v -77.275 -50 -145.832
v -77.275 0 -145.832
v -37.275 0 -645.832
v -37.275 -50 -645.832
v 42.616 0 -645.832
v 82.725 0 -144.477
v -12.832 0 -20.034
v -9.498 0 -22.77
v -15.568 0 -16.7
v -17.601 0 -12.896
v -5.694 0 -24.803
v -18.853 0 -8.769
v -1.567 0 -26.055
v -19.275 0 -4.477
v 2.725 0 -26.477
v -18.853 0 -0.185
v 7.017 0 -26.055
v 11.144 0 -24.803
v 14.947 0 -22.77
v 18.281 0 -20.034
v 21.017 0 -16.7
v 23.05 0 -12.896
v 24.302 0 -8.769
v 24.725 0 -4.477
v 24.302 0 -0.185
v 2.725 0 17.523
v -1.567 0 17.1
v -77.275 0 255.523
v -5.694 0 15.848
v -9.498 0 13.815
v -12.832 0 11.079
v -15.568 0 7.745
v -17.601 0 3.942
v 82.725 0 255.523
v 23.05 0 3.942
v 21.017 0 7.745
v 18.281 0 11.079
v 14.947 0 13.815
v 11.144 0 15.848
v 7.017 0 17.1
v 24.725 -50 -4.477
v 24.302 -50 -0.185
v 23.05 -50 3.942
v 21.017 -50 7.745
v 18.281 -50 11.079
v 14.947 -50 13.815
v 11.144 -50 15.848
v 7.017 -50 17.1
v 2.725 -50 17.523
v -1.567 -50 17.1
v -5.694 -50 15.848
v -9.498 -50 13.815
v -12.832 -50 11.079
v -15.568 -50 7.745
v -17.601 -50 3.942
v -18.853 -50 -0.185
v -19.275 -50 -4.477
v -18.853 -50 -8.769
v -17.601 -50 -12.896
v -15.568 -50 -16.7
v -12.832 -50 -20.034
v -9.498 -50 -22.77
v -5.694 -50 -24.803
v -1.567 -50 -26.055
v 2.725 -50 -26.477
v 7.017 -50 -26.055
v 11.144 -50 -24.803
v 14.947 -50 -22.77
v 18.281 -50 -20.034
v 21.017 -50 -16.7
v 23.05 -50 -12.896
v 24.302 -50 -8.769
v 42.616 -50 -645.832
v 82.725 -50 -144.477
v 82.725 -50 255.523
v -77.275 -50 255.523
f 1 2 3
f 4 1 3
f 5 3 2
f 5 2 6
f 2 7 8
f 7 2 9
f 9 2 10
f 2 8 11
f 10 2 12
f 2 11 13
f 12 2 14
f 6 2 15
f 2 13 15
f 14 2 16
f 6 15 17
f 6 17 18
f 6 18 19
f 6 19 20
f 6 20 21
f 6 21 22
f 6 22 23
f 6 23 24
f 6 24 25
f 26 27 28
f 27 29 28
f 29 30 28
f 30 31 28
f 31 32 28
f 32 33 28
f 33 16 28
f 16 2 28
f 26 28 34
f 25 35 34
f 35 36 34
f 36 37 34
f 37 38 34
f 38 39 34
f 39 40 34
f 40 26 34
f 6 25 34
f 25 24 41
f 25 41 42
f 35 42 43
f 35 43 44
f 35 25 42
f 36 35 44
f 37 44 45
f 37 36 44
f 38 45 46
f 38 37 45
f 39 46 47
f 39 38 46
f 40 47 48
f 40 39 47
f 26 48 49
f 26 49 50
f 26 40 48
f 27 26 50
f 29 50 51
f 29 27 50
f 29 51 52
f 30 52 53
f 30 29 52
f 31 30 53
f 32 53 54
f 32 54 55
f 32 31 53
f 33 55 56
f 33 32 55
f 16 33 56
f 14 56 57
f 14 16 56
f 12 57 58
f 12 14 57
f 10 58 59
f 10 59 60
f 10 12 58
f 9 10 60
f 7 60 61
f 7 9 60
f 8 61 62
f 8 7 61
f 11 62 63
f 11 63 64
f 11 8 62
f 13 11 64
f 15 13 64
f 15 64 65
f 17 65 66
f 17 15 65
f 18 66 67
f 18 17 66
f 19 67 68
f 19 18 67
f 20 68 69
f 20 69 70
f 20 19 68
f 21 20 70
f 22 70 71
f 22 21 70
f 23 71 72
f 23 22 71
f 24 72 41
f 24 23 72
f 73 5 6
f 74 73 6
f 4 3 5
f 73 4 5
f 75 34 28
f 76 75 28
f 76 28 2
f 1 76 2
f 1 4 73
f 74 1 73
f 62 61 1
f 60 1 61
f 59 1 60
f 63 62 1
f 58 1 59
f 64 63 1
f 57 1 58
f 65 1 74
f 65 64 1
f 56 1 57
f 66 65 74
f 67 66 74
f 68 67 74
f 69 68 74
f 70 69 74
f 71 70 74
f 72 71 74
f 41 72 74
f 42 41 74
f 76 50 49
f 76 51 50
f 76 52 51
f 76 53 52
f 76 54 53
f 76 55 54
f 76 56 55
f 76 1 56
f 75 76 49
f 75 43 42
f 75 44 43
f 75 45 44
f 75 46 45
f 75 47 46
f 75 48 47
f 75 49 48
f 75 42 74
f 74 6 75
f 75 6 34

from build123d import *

# Parameters (mm, degrees)
F0_R     = 22
F1_DEPTH = 50


# Not quite as in the source:
# - a feature names something its author has since deleted; it is built from what else it names


with BuildPart() as f1:
    # F0 (on Front) → F1 (new body)
    with BuildSketch(Plane.XZ):
        Polygon((82.7246823907, 255.5227107533), (-77.2753176093, 255.5227107533), (-77.2753176093, -145.831789898), (-37.2753176093, -645.831789898), (42.6163223386, -645.831789898), (82.7246823907, -144.4772892467), align=None)
        with Locations((2.7246823907, -4.4772892467)):
            Circle(F0_R, mode=Mode.SUBTRACT)
    extrude(amount=F1_DEPTH)


solid = f1.part
